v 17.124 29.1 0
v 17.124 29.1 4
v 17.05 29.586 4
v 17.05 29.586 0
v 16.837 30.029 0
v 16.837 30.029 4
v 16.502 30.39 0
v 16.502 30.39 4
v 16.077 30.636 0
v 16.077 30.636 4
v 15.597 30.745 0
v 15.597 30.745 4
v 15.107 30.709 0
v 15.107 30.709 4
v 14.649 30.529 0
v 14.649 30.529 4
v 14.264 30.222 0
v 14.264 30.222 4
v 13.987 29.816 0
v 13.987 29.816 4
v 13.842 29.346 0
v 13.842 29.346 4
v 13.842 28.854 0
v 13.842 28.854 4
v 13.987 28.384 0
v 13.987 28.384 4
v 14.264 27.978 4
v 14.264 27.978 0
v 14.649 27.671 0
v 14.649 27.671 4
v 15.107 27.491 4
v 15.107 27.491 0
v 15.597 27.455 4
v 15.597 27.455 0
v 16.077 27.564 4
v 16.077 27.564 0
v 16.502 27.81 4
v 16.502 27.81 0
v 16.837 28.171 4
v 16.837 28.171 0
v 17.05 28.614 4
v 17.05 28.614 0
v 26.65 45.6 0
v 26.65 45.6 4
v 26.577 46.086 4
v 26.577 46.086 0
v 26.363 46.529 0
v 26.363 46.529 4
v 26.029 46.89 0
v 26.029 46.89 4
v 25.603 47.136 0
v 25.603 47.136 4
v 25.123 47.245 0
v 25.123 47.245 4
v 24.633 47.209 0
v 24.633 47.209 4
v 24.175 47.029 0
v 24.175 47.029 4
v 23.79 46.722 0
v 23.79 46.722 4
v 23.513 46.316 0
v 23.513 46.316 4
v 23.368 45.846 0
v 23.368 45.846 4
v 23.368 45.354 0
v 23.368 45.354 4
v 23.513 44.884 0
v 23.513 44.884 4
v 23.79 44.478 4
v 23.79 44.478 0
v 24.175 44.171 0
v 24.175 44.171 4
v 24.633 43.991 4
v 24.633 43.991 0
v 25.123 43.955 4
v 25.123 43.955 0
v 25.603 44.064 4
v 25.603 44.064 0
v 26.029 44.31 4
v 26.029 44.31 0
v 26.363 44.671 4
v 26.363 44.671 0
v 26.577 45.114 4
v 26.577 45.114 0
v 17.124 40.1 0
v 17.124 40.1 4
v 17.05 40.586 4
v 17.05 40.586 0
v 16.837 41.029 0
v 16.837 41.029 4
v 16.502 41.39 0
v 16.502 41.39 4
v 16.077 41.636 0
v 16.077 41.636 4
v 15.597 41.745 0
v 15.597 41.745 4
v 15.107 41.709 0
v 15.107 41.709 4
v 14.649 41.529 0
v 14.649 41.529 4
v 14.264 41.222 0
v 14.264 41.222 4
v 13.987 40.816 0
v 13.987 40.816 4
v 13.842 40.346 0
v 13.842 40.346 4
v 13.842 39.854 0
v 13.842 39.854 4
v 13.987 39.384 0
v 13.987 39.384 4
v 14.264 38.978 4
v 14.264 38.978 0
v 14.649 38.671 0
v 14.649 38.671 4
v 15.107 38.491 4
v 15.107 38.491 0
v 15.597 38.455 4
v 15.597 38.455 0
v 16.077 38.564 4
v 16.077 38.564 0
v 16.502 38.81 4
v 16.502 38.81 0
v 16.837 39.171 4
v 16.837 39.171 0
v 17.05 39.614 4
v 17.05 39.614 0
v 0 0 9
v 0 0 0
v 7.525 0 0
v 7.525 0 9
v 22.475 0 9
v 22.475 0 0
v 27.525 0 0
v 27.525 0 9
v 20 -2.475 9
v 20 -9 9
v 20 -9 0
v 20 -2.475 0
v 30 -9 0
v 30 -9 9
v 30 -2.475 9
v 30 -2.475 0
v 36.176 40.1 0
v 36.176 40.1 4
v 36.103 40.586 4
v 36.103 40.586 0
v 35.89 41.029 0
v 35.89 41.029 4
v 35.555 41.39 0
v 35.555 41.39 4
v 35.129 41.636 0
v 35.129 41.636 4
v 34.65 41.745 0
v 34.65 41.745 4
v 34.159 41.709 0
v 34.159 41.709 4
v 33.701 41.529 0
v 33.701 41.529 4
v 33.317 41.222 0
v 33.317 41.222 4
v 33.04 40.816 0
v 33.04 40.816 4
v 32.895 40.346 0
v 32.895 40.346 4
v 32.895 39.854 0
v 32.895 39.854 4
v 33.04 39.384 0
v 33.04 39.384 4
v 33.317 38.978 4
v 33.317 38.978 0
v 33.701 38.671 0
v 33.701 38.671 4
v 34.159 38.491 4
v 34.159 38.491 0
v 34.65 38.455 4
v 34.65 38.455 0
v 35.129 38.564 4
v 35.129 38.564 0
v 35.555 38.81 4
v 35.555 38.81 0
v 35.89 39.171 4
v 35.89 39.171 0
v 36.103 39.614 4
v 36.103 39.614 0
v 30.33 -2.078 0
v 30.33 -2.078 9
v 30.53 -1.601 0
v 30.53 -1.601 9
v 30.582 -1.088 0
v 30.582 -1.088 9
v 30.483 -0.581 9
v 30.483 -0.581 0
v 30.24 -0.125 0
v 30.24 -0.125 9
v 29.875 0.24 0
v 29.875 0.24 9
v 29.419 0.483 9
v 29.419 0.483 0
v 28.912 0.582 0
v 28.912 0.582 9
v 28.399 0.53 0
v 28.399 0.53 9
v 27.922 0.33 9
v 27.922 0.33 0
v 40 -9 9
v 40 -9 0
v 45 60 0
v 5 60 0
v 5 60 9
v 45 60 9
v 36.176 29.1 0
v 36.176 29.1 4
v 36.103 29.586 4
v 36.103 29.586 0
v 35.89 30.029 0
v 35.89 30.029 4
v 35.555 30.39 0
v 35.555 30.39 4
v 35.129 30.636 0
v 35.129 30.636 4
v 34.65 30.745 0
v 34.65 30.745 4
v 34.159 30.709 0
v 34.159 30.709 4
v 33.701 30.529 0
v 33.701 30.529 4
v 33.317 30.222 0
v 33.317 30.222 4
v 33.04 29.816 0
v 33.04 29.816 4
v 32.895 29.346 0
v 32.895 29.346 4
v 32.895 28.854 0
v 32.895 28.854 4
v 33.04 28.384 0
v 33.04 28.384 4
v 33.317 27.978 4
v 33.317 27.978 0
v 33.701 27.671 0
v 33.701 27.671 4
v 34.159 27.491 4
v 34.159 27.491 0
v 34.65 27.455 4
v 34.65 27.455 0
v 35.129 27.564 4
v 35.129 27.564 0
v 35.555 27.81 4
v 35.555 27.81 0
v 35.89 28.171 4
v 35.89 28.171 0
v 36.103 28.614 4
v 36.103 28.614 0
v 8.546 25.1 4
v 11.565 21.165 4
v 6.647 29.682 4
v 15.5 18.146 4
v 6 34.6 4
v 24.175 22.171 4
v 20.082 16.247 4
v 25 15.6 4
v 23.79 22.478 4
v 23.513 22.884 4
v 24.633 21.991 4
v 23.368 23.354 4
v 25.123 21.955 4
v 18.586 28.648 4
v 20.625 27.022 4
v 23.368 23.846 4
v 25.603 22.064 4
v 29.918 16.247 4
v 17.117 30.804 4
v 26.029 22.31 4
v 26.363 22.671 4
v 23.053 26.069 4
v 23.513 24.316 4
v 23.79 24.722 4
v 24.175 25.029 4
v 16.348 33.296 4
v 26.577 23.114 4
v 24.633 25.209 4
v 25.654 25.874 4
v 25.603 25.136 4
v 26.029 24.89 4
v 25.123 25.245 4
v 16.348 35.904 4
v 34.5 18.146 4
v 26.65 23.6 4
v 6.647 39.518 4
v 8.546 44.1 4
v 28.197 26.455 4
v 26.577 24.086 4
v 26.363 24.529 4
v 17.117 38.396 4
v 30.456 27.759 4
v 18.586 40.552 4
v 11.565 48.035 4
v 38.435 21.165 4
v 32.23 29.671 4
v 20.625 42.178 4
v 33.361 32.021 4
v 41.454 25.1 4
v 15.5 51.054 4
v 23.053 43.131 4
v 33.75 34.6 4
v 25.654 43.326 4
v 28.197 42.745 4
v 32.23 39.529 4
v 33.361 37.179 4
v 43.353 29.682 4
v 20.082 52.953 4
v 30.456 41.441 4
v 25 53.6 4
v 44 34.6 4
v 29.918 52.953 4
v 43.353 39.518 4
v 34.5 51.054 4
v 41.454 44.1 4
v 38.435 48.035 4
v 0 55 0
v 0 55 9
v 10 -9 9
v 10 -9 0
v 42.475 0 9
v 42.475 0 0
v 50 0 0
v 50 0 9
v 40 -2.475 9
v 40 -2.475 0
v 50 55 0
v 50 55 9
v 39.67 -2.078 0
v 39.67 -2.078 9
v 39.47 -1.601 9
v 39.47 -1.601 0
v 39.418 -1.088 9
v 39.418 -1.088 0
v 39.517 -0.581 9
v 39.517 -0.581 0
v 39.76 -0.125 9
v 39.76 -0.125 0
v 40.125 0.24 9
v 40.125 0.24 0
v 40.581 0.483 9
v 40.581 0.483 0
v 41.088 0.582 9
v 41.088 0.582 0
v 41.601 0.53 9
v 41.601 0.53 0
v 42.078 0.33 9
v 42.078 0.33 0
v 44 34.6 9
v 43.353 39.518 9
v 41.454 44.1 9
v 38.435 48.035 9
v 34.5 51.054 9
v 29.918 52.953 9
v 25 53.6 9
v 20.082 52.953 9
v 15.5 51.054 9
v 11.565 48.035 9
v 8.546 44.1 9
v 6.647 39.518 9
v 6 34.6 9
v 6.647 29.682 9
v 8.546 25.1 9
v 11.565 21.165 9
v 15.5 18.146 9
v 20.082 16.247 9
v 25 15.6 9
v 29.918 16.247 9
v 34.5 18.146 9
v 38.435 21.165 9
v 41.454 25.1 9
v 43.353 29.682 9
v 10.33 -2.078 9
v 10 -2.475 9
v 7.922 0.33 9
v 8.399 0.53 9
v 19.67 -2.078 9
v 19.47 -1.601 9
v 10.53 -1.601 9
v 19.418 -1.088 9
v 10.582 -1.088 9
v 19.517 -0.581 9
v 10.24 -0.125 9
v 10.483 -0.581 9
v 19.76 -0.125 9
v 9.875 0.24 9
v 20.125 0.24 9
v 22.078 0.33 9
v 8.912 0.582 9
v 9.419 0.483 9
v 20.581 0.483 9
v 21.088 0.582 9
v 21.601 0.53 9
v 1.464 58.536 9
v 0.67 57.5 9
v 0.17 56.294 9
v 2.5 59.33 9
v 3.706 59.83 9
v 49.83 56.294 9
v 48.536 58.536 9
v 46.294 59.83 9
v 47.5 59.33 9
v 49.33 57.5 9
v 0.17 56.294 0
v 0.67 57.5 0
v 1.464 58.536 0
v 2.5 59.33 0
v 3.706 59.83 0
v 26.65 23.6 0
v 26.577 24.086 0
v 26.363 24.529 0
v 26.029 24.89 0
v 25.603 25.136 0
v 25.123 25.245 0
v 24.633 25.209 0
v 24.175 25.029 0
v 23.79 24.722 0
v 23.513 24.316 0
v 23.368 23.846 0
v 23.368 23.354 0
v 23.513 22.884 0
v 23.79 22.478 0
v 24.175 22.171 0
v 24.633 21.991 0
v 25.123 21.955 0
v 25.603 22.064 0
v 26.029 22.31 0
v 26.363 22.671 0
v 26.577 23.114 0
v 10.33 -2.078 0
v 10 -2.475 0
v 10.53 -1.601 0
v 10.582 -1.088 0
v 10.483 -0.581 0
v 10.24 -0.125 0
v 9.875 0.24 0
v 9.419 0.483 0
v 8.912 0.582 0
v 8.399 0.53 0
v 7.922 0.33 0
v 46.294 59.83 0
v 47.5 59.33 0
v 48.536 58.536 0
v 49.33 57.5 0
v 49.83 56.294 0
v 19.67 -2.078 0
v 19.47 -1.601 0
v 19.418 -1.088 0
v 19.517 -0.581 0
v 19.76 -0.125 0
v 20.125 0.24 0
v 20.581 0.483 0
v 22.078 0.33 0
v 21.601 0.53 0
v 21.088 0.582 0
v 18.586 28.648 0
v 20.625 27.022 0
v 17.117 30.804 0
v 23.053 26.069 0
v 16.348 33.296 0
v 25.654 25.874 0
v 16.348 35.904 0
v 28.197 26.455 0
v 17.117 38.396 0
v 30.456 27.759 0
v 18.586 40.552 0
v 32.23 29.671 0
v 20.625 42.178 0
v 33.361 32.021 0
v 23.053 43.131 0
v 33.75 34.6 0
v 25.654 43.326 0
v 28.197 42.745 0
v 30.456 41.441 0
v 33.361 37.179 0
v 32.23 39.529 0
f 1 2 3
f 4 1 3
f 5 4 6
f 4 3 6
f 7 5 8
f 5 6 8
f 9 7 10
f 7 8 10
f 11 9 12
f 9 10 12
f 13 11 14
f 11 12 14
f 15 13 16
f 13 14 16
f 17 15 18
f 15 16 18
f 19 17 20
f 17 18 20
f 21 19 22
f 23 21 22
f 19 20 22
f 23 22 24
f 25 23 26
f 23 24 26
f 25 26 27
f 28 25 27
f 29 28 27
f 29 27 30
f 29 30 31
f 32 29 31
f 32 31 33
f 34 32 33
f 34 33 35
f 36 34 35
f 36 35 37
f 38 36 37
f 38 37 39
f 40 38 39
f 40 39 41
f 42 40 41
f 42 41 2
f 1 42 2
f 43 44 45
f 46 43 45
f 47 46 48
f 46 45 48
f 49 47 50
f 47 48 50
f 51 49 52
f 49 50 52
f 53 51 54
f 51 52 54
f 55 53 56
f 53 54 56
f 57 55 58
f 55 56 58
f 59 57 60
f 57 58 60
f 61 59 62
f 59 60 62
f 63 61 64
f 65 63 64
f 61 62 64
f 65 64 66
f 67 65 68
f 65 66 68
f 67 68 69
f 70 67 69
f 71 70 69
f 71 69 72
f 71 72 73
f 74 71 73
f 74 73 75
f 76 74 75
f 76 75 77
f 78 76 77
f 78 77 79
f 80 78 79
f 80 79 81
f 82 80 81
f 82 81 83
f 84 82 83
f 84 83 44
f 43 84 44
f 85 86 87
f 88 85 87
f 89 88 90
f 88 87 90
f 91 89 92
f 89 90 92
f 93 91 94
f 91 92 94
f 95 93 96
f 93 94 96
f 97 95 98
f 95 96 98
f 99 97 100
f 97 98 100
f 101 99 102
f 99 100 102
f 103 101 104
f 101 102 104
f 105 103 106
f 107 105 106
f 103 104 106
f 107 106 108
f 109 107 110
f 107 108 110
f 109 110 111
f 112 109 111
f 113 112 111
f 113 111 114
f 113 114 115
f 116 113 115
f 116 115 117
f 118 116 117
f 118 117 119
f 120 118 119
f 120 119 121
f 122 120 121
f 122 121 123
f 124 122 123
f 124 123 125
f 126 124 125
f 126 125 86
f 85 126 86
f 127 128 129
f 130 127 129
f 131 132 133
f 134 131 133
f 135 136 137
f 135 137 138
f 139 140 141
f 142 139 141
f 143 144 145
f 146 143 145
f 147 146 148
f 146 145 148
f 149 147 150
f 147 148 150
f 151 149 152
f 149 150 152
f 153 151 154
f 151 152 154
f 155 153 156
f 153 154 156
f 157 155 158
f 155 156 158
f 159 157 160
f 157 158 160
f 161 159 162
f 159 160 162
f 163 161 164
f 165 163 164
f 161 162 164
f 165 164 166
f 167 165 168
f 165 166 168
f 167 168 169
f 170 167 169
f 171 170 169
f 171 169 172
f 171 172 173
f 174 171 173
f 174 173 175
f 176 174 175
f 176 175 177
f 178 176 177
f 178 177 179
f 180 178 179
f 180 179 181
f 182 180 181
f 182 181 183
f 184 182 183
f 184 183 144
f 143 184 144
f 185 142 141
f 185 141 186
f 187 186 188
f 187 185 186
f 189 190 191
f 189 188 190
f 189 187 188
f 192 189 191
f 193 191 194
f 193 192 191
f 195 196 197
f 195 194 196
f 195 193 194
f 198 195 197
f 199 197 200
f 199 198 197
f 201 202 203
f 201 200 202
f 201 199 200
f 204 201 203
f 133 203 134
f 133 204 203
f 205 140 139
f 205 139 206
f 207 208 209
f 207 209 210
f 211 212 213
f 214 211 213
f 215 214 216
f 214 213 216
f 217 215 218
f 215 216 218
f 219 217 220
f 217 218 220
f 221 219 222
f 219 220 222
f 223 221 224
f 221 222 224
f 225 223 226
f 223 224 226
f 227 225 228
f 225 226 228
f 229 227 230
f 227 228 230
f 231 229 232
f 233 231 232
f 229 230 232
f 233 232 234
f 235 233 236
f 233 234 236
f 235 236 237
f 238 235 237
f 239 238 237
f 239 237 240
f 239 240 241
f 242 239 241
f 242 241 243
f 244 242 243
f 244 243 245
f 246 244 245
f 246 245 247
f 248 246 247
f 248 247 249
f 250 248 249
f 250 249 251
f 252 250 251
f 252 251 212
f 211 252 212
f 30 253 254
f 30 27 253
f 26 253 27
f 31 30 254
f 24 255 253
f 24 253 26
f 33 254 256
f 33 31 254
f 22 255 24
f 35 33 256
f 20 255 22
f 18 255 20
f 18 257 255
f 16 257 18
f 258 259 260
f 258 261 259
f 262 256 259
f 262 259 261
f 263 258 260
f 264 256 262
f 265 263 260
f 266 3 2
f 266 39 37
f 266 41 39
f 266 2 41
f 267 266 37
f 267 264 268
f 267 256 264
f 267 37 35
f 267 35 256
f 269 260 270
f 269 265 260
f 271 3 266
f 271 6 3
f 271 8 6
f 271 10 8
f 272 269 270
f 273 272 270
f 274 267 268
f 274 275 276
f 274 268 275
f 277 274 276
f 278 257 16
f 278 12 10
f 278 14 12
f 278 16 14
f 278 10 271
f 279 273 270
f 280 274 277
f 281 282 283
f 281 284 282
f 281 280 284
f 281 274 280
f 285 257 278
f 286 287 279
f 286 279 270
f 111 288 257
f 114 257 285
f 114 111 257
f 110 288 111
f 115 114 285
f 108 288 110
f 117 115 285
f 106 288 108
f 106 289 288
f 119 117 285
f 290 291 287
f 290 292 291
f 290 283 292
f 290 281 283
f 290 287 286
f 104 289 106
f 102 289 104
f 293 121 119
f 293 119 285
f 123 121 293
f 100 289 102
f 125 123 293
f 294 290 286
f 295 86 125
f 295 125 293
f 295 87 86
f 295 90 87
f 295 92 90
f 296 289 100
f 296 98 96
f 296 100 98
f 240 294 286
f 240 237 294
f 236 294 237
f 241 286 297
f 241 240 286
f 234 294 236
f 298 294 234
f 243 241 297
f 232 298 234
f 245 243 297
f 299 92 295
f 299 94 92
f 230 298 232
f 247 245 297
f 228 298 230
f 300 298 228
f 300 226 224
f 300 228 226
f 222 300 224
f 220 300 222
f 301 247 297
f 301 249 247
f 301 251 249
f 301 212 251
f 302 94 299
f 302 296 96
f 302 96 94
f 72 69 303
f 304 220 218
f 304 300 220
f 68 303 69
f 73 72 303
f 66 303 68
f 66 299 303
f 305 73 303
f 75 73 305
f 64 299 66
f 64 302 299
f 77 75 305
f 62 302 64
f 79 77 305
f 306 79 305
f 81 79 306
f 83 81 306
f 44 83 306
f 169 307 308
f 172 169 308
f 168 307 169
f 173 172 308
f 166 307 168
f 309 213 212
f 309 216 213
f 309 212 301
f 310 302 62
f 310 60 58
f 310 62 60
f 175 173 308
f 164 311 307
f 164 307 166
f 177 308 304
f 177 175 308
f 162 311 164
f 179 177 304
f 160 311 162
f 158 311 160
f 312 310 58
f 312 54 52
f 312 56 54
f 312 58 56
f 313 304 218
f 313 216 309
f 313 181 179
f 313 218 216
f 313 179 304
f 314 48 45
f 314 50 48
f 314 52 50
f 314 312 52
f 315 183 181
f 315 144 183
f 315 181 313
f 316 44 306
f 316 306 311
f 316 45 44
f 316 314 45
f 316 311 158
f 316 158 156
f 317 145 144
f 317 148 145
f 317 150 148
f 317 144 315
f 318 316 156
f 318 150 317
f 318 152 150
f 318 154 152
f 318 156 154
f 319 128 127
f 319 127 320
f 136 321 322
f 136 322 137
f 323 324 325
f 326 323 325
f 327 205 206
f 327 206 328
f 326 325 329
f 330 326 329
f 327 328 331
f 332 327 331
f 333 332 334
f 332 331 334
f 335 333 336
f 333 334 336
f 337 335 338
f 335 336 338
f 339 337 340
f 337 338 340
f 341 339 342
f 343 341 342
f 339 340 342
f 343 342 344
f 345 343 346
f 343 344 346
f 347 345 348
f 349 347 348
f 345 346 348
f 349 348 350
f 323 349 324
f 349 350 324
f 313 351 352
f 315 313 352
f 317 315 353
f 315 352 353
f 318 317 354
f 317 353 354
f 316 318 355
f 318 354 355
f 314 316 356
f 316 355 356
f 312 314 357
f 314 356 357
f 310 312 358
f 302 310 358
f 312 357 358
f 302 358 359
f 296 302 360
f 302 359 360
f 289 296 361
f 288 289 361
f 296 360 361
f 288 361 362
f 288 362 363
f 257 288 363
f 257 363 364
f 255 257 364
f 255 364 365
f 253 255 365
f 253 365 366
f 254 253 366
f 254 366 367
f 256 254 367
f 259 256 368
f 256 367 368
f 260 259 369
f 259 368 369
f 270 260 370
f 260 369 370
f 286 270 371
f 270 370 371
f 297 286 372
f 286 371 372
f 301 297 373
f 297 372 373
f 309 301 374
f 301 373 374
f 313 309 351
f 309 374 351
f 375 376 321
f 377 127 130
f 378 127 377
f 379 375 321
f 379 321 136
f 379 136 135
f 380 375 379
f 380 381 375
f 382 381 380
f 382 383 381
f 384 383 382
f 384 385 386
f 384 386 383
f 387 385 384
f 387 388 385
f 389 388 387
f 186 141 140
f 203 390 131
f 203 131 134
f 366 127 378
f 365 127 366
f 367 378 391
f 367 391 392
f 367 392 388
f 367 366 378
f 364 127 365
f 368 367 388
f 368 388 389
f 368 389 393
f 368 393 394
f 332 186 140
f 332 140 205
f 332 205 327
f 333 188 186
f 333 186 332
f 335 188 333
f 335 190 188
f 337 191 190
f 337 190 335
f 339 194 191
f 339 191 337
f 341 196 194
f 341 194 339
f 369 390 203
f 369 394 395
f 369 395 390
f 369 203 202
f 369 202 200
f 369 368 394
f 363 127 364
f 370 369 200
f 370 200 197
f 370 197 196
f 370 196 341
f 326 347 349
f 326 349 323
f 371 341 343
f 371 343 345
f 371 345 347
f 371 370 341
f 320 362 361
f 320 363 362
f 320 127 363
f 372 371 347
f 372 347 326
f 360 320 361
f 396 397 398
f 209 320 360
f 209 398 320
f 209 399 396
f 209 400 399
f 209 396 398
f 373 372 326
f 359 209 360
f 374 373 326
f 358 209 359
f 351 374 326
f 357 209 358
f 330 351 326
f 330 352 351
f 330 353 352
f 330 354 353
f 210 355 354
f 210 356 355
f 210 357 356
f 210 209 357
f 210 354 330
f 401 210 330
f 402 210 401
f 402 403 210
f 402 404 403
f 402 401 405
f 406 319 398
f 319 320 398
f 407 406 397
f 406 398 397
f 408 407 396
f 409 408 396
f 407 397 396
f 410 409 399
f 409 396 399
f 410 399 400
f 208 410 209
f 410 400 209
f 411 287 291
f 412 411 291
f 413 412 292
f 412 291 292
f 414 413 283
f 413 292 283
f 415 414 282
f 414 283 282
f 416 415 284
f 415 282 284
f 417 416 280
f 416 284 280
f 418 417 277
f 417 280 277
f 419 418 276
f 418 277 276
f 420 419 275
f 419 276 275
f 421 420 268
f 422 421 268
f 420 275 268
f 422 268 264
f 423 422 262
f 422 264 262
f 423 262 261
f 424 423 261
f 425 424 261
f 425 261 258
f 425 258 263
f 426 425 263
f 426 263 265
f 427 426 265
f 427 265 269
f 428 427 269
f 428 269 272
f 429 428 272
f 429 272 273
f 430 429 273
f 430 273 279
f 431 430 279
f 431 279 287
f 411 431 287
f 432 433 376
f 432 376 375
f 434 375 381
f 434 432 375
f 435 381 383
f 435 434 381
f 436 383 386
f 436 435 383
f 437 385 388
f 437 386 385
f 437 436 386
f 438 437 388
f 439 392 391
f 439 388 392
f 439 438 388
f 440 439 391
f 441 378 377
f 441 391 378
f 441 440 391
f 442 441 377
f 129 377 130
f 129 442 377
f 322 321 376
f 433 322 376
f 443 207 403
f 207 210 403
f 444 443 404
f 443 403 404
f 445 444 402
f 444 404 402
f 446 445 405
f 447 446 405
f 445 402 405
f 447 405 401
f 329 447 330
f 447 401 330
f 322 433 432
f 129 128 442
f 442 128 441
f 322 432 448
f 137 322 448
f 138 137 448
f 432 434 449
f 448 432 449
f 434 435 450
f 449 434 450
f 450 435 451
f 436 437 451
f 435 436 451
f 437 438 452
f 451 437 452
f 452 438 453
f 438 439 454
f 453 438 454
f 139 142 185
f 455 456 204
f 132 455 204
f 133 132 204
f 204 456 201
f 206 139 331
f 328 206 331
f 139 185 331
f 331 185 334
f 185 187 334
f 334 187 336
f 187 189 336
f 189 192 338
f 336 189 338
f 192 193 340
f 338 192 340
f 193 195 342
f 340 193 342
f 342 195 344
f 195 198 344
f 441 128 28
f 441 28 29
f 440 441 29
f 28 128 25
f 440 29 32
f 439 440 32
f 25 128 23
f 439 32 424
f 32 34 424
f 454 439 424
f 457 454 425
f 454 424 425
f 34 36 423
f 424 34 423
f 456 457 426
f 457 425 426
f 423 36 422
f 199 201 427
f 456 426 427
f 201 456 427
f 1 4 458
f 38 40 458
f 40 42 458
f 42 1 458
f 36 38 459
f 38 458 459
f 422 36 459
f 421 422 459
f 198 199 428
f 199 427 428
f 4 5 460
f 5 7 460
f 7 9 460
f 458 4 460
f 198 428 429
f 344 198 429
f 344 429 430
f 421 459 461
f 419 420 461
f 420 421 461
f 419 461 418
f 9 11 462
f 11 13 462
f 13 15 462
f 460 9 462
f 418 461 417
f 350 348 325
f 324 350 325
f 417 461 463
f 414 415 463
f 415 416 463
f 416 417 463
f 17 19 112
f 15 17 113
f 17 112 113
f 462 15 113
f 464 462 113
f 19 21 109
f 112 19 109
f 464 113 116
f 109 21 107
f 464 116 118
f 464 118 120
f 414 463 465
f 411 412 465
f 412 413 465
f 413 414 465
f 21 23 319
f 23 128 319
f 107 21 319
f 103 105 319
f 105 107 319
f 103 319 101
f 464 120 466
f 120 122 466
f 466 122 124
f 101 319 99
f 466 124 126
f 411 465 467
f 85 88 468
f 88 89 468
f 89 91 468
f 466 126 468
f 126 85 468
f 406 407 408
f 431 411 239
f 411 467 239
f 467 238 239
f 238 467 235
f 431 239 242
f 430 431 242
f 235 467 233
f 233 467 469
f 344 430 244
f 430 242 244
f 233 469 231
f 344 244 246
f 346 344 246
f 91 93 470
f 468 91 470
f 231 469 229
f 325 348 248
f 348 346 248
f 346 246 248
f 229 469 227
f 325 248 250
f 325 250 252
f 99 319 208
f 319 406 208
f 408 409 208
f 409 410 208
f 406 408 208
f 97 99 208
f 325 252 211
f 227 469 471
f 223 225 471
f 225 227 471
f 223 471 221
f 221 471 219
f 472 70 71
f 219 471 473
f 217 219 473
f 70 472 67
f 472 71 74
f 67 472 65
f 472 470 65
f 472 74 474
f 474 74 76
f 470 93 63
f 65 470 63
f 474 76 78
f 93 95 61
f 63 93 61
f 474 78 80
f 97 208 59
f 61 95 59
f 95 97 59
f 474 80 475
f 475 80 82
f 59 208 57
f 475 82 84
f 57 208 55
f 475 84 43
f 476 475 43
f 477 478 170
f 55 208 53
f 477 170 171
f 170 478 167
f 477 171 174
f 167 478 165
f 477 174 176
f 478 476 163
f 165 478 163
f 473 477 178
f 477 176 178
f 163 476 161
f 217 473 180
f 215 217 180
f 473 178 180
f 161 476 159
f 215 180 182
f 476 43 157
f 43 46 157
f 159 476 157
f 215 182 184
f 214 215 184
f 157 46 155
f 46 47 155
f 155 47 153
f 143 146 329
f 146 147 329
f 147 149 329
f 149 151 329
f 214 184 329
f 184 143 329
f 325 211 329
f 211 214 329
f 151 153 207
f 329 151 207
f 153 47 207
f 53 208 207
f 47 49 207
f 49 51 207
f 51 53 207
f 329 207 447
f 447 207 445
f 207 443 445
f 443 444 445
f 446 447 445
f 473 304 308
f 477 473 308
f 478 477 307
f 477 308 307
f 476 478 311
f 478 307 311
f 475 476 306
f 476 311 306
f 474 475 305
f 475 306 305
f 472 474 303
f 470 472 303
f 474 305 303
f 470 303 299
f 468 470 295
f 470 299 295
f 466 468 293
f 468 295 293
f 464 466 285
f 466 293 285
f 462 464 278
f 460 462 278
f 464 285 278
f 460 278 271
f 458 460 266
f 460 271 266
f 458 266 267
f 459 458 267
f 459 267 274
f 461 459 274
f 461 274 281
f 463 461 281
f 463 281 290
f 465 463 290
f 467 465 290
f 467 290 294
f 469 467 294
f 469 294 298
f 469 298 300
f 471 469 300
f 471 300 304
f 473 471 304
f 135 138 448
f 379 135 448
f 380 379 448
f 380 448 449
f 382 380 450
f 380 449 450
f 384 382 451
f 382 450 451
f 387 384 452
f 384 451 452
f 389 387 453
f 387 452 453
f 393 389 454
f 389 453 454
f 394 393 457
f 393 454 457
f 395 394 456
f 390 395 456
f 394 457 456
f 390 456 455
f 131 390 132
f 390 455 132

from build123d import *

# Parameters (mm, degrees)
ESQUISSE1_W                  = 50
ESQUISSE1_H                  = 60
BOSS_EXTRU_1_DEPTH           = 9
ESQUISSE2_W                  = 10
ESQUISSE2_H                  = 9
BOSS_EXTRU_2_DEPTH           = 9
ESQUISSE3_R                  = 8.75
ESQUISSE3_R_2                = 1.65
ENL_V_MAT_EXTRU_1_DEPTH      = 9
ESQUISSE4_R                  = 19
ENL_V_MAT_EXTRU_2_DEPTH      = 5
CONG_1_R                     = 5
ENL_V_MAT_EXTRU_3_DEPTH      = 79.619336044
ENL_V_MAT_EXTRU_3_DEPTH_BACK = 79.619336044


with BuildPart() as part:
    # Esquisse1 → Boss.-Extru.1 (new body)
    with BuildSketch(Plane.XY):
        with Locations((25, 30)):
            Rectangle(ESQUISSE1_W, ESQUISSE1_H)
    extrude(amount=BOSS_EXTRU_1_DEPTH)

    # Esquisse2 → Boss.-Extru.2 (add)
    with BuildSketch(Plane.XY.offset(9)):
        with Locations((35, -4.5)):
            Rectangle(ESQUISSE2_W, ESQUISSE2_H)
        with Locations((15, -4.5)):
            Rectangle(ESQUISSE2_W, ESQUISSE2_H)
    extrude(amount=-BOSS_EXTRU_2_DEPTH)

    # Esquisse3 → Enlèv. mat.-Extru.1 (cut)
    with BuildSketch(Plane.XY.offset(9)):
        with Locations((25, 34.6)):
            Circle(ESQUISSE3_R)
        with Locations((25, 45.6)):
            Circle(ESQUISSE3_R_2)
        with Locations((34.526279442, 40.1)):
            Circle(ESQUISSE3_R_2)
        with Locations((34.526279442, 29.1)):
            Circle(ESQUISSE3_R_2)
        with Locations((25, 23.6)):
            Circle(ESQUISSE3_R_2)
        with Locations((15.473720558, 29.1)):
            Circle(ESQUISSE3_R_2)
        with Locations((15.473720558, 40.1)):
            Circle(ESQUISSE3_R_2)
    extrude(amount=-ENL_V_MAT_EXTRU_1_DEPTH, mode=Mode.SUBTRACT)

    # Esquisse4 → Enlèv. mat.-Extru.2 (cut)
    with BuildSketch(Plane.XY.offset(9)):
        with Locations((25, 34.6)):
            Circle(ESQUISSE4_R)
    extrude(amount=-ENL_V_MAT_EXTRU_2_DEPTH, mode=Mode.SUBTRACT)

    # Congé1
    cong_1_edges = [part.edges().sort_by_distance(p)[0] for p in [
        (0, 60, 4.5),
        (50, 60, 4.5),
    ]]
    fillet(cong_1_edges, radius=CONG_1_R)

    # Esquisse5 → Enlèv. mat.-Extru.3 (cut, two sides: drawn at the far end of the back side and taken through both)
    with BuildSketch(Plane.XY.offset(9).offset(-ENL_V_MAT_EXTRU_3_DEPTH_BACK)):
        with BuildLine():
            Line((27.525126266, 0), (30, -2.474873734))
            ThreePointArc((30, -2.474873734), (30.070710678, 0.070710678), (27.525126266, 0))
        make_face()
        with BuildLine():
            Line((22.474873734, 0), (20, -2.474873734))
            ThreePointArc((20, -2.474873734), (19.929289322, 0.070710678), (22.474873734, 0))
        make_face()
        with BuildLine():
            Line((42.474873734, 0), (40, -2.474873734))
            ThreePointArc((40, -2.474873734), (39.929289322, 0.070710678), (42.474873734, 0))
        make_face()
        with BuildLine():
            Line((7.525126266, 0), (10, -2.474873734))
            ThreePointArc((10, -2.474873734), (10.070710678, 0.070710678), (7.525126266, 0))
        make_face()
    extrude(amount=ENL_V_MAT_EXTRU_3_DEPTH + ENL_V_MAT_EXTRU_3_DEPTH_BACK, mode=Mode.SUBTRACT)


solid = part.part
